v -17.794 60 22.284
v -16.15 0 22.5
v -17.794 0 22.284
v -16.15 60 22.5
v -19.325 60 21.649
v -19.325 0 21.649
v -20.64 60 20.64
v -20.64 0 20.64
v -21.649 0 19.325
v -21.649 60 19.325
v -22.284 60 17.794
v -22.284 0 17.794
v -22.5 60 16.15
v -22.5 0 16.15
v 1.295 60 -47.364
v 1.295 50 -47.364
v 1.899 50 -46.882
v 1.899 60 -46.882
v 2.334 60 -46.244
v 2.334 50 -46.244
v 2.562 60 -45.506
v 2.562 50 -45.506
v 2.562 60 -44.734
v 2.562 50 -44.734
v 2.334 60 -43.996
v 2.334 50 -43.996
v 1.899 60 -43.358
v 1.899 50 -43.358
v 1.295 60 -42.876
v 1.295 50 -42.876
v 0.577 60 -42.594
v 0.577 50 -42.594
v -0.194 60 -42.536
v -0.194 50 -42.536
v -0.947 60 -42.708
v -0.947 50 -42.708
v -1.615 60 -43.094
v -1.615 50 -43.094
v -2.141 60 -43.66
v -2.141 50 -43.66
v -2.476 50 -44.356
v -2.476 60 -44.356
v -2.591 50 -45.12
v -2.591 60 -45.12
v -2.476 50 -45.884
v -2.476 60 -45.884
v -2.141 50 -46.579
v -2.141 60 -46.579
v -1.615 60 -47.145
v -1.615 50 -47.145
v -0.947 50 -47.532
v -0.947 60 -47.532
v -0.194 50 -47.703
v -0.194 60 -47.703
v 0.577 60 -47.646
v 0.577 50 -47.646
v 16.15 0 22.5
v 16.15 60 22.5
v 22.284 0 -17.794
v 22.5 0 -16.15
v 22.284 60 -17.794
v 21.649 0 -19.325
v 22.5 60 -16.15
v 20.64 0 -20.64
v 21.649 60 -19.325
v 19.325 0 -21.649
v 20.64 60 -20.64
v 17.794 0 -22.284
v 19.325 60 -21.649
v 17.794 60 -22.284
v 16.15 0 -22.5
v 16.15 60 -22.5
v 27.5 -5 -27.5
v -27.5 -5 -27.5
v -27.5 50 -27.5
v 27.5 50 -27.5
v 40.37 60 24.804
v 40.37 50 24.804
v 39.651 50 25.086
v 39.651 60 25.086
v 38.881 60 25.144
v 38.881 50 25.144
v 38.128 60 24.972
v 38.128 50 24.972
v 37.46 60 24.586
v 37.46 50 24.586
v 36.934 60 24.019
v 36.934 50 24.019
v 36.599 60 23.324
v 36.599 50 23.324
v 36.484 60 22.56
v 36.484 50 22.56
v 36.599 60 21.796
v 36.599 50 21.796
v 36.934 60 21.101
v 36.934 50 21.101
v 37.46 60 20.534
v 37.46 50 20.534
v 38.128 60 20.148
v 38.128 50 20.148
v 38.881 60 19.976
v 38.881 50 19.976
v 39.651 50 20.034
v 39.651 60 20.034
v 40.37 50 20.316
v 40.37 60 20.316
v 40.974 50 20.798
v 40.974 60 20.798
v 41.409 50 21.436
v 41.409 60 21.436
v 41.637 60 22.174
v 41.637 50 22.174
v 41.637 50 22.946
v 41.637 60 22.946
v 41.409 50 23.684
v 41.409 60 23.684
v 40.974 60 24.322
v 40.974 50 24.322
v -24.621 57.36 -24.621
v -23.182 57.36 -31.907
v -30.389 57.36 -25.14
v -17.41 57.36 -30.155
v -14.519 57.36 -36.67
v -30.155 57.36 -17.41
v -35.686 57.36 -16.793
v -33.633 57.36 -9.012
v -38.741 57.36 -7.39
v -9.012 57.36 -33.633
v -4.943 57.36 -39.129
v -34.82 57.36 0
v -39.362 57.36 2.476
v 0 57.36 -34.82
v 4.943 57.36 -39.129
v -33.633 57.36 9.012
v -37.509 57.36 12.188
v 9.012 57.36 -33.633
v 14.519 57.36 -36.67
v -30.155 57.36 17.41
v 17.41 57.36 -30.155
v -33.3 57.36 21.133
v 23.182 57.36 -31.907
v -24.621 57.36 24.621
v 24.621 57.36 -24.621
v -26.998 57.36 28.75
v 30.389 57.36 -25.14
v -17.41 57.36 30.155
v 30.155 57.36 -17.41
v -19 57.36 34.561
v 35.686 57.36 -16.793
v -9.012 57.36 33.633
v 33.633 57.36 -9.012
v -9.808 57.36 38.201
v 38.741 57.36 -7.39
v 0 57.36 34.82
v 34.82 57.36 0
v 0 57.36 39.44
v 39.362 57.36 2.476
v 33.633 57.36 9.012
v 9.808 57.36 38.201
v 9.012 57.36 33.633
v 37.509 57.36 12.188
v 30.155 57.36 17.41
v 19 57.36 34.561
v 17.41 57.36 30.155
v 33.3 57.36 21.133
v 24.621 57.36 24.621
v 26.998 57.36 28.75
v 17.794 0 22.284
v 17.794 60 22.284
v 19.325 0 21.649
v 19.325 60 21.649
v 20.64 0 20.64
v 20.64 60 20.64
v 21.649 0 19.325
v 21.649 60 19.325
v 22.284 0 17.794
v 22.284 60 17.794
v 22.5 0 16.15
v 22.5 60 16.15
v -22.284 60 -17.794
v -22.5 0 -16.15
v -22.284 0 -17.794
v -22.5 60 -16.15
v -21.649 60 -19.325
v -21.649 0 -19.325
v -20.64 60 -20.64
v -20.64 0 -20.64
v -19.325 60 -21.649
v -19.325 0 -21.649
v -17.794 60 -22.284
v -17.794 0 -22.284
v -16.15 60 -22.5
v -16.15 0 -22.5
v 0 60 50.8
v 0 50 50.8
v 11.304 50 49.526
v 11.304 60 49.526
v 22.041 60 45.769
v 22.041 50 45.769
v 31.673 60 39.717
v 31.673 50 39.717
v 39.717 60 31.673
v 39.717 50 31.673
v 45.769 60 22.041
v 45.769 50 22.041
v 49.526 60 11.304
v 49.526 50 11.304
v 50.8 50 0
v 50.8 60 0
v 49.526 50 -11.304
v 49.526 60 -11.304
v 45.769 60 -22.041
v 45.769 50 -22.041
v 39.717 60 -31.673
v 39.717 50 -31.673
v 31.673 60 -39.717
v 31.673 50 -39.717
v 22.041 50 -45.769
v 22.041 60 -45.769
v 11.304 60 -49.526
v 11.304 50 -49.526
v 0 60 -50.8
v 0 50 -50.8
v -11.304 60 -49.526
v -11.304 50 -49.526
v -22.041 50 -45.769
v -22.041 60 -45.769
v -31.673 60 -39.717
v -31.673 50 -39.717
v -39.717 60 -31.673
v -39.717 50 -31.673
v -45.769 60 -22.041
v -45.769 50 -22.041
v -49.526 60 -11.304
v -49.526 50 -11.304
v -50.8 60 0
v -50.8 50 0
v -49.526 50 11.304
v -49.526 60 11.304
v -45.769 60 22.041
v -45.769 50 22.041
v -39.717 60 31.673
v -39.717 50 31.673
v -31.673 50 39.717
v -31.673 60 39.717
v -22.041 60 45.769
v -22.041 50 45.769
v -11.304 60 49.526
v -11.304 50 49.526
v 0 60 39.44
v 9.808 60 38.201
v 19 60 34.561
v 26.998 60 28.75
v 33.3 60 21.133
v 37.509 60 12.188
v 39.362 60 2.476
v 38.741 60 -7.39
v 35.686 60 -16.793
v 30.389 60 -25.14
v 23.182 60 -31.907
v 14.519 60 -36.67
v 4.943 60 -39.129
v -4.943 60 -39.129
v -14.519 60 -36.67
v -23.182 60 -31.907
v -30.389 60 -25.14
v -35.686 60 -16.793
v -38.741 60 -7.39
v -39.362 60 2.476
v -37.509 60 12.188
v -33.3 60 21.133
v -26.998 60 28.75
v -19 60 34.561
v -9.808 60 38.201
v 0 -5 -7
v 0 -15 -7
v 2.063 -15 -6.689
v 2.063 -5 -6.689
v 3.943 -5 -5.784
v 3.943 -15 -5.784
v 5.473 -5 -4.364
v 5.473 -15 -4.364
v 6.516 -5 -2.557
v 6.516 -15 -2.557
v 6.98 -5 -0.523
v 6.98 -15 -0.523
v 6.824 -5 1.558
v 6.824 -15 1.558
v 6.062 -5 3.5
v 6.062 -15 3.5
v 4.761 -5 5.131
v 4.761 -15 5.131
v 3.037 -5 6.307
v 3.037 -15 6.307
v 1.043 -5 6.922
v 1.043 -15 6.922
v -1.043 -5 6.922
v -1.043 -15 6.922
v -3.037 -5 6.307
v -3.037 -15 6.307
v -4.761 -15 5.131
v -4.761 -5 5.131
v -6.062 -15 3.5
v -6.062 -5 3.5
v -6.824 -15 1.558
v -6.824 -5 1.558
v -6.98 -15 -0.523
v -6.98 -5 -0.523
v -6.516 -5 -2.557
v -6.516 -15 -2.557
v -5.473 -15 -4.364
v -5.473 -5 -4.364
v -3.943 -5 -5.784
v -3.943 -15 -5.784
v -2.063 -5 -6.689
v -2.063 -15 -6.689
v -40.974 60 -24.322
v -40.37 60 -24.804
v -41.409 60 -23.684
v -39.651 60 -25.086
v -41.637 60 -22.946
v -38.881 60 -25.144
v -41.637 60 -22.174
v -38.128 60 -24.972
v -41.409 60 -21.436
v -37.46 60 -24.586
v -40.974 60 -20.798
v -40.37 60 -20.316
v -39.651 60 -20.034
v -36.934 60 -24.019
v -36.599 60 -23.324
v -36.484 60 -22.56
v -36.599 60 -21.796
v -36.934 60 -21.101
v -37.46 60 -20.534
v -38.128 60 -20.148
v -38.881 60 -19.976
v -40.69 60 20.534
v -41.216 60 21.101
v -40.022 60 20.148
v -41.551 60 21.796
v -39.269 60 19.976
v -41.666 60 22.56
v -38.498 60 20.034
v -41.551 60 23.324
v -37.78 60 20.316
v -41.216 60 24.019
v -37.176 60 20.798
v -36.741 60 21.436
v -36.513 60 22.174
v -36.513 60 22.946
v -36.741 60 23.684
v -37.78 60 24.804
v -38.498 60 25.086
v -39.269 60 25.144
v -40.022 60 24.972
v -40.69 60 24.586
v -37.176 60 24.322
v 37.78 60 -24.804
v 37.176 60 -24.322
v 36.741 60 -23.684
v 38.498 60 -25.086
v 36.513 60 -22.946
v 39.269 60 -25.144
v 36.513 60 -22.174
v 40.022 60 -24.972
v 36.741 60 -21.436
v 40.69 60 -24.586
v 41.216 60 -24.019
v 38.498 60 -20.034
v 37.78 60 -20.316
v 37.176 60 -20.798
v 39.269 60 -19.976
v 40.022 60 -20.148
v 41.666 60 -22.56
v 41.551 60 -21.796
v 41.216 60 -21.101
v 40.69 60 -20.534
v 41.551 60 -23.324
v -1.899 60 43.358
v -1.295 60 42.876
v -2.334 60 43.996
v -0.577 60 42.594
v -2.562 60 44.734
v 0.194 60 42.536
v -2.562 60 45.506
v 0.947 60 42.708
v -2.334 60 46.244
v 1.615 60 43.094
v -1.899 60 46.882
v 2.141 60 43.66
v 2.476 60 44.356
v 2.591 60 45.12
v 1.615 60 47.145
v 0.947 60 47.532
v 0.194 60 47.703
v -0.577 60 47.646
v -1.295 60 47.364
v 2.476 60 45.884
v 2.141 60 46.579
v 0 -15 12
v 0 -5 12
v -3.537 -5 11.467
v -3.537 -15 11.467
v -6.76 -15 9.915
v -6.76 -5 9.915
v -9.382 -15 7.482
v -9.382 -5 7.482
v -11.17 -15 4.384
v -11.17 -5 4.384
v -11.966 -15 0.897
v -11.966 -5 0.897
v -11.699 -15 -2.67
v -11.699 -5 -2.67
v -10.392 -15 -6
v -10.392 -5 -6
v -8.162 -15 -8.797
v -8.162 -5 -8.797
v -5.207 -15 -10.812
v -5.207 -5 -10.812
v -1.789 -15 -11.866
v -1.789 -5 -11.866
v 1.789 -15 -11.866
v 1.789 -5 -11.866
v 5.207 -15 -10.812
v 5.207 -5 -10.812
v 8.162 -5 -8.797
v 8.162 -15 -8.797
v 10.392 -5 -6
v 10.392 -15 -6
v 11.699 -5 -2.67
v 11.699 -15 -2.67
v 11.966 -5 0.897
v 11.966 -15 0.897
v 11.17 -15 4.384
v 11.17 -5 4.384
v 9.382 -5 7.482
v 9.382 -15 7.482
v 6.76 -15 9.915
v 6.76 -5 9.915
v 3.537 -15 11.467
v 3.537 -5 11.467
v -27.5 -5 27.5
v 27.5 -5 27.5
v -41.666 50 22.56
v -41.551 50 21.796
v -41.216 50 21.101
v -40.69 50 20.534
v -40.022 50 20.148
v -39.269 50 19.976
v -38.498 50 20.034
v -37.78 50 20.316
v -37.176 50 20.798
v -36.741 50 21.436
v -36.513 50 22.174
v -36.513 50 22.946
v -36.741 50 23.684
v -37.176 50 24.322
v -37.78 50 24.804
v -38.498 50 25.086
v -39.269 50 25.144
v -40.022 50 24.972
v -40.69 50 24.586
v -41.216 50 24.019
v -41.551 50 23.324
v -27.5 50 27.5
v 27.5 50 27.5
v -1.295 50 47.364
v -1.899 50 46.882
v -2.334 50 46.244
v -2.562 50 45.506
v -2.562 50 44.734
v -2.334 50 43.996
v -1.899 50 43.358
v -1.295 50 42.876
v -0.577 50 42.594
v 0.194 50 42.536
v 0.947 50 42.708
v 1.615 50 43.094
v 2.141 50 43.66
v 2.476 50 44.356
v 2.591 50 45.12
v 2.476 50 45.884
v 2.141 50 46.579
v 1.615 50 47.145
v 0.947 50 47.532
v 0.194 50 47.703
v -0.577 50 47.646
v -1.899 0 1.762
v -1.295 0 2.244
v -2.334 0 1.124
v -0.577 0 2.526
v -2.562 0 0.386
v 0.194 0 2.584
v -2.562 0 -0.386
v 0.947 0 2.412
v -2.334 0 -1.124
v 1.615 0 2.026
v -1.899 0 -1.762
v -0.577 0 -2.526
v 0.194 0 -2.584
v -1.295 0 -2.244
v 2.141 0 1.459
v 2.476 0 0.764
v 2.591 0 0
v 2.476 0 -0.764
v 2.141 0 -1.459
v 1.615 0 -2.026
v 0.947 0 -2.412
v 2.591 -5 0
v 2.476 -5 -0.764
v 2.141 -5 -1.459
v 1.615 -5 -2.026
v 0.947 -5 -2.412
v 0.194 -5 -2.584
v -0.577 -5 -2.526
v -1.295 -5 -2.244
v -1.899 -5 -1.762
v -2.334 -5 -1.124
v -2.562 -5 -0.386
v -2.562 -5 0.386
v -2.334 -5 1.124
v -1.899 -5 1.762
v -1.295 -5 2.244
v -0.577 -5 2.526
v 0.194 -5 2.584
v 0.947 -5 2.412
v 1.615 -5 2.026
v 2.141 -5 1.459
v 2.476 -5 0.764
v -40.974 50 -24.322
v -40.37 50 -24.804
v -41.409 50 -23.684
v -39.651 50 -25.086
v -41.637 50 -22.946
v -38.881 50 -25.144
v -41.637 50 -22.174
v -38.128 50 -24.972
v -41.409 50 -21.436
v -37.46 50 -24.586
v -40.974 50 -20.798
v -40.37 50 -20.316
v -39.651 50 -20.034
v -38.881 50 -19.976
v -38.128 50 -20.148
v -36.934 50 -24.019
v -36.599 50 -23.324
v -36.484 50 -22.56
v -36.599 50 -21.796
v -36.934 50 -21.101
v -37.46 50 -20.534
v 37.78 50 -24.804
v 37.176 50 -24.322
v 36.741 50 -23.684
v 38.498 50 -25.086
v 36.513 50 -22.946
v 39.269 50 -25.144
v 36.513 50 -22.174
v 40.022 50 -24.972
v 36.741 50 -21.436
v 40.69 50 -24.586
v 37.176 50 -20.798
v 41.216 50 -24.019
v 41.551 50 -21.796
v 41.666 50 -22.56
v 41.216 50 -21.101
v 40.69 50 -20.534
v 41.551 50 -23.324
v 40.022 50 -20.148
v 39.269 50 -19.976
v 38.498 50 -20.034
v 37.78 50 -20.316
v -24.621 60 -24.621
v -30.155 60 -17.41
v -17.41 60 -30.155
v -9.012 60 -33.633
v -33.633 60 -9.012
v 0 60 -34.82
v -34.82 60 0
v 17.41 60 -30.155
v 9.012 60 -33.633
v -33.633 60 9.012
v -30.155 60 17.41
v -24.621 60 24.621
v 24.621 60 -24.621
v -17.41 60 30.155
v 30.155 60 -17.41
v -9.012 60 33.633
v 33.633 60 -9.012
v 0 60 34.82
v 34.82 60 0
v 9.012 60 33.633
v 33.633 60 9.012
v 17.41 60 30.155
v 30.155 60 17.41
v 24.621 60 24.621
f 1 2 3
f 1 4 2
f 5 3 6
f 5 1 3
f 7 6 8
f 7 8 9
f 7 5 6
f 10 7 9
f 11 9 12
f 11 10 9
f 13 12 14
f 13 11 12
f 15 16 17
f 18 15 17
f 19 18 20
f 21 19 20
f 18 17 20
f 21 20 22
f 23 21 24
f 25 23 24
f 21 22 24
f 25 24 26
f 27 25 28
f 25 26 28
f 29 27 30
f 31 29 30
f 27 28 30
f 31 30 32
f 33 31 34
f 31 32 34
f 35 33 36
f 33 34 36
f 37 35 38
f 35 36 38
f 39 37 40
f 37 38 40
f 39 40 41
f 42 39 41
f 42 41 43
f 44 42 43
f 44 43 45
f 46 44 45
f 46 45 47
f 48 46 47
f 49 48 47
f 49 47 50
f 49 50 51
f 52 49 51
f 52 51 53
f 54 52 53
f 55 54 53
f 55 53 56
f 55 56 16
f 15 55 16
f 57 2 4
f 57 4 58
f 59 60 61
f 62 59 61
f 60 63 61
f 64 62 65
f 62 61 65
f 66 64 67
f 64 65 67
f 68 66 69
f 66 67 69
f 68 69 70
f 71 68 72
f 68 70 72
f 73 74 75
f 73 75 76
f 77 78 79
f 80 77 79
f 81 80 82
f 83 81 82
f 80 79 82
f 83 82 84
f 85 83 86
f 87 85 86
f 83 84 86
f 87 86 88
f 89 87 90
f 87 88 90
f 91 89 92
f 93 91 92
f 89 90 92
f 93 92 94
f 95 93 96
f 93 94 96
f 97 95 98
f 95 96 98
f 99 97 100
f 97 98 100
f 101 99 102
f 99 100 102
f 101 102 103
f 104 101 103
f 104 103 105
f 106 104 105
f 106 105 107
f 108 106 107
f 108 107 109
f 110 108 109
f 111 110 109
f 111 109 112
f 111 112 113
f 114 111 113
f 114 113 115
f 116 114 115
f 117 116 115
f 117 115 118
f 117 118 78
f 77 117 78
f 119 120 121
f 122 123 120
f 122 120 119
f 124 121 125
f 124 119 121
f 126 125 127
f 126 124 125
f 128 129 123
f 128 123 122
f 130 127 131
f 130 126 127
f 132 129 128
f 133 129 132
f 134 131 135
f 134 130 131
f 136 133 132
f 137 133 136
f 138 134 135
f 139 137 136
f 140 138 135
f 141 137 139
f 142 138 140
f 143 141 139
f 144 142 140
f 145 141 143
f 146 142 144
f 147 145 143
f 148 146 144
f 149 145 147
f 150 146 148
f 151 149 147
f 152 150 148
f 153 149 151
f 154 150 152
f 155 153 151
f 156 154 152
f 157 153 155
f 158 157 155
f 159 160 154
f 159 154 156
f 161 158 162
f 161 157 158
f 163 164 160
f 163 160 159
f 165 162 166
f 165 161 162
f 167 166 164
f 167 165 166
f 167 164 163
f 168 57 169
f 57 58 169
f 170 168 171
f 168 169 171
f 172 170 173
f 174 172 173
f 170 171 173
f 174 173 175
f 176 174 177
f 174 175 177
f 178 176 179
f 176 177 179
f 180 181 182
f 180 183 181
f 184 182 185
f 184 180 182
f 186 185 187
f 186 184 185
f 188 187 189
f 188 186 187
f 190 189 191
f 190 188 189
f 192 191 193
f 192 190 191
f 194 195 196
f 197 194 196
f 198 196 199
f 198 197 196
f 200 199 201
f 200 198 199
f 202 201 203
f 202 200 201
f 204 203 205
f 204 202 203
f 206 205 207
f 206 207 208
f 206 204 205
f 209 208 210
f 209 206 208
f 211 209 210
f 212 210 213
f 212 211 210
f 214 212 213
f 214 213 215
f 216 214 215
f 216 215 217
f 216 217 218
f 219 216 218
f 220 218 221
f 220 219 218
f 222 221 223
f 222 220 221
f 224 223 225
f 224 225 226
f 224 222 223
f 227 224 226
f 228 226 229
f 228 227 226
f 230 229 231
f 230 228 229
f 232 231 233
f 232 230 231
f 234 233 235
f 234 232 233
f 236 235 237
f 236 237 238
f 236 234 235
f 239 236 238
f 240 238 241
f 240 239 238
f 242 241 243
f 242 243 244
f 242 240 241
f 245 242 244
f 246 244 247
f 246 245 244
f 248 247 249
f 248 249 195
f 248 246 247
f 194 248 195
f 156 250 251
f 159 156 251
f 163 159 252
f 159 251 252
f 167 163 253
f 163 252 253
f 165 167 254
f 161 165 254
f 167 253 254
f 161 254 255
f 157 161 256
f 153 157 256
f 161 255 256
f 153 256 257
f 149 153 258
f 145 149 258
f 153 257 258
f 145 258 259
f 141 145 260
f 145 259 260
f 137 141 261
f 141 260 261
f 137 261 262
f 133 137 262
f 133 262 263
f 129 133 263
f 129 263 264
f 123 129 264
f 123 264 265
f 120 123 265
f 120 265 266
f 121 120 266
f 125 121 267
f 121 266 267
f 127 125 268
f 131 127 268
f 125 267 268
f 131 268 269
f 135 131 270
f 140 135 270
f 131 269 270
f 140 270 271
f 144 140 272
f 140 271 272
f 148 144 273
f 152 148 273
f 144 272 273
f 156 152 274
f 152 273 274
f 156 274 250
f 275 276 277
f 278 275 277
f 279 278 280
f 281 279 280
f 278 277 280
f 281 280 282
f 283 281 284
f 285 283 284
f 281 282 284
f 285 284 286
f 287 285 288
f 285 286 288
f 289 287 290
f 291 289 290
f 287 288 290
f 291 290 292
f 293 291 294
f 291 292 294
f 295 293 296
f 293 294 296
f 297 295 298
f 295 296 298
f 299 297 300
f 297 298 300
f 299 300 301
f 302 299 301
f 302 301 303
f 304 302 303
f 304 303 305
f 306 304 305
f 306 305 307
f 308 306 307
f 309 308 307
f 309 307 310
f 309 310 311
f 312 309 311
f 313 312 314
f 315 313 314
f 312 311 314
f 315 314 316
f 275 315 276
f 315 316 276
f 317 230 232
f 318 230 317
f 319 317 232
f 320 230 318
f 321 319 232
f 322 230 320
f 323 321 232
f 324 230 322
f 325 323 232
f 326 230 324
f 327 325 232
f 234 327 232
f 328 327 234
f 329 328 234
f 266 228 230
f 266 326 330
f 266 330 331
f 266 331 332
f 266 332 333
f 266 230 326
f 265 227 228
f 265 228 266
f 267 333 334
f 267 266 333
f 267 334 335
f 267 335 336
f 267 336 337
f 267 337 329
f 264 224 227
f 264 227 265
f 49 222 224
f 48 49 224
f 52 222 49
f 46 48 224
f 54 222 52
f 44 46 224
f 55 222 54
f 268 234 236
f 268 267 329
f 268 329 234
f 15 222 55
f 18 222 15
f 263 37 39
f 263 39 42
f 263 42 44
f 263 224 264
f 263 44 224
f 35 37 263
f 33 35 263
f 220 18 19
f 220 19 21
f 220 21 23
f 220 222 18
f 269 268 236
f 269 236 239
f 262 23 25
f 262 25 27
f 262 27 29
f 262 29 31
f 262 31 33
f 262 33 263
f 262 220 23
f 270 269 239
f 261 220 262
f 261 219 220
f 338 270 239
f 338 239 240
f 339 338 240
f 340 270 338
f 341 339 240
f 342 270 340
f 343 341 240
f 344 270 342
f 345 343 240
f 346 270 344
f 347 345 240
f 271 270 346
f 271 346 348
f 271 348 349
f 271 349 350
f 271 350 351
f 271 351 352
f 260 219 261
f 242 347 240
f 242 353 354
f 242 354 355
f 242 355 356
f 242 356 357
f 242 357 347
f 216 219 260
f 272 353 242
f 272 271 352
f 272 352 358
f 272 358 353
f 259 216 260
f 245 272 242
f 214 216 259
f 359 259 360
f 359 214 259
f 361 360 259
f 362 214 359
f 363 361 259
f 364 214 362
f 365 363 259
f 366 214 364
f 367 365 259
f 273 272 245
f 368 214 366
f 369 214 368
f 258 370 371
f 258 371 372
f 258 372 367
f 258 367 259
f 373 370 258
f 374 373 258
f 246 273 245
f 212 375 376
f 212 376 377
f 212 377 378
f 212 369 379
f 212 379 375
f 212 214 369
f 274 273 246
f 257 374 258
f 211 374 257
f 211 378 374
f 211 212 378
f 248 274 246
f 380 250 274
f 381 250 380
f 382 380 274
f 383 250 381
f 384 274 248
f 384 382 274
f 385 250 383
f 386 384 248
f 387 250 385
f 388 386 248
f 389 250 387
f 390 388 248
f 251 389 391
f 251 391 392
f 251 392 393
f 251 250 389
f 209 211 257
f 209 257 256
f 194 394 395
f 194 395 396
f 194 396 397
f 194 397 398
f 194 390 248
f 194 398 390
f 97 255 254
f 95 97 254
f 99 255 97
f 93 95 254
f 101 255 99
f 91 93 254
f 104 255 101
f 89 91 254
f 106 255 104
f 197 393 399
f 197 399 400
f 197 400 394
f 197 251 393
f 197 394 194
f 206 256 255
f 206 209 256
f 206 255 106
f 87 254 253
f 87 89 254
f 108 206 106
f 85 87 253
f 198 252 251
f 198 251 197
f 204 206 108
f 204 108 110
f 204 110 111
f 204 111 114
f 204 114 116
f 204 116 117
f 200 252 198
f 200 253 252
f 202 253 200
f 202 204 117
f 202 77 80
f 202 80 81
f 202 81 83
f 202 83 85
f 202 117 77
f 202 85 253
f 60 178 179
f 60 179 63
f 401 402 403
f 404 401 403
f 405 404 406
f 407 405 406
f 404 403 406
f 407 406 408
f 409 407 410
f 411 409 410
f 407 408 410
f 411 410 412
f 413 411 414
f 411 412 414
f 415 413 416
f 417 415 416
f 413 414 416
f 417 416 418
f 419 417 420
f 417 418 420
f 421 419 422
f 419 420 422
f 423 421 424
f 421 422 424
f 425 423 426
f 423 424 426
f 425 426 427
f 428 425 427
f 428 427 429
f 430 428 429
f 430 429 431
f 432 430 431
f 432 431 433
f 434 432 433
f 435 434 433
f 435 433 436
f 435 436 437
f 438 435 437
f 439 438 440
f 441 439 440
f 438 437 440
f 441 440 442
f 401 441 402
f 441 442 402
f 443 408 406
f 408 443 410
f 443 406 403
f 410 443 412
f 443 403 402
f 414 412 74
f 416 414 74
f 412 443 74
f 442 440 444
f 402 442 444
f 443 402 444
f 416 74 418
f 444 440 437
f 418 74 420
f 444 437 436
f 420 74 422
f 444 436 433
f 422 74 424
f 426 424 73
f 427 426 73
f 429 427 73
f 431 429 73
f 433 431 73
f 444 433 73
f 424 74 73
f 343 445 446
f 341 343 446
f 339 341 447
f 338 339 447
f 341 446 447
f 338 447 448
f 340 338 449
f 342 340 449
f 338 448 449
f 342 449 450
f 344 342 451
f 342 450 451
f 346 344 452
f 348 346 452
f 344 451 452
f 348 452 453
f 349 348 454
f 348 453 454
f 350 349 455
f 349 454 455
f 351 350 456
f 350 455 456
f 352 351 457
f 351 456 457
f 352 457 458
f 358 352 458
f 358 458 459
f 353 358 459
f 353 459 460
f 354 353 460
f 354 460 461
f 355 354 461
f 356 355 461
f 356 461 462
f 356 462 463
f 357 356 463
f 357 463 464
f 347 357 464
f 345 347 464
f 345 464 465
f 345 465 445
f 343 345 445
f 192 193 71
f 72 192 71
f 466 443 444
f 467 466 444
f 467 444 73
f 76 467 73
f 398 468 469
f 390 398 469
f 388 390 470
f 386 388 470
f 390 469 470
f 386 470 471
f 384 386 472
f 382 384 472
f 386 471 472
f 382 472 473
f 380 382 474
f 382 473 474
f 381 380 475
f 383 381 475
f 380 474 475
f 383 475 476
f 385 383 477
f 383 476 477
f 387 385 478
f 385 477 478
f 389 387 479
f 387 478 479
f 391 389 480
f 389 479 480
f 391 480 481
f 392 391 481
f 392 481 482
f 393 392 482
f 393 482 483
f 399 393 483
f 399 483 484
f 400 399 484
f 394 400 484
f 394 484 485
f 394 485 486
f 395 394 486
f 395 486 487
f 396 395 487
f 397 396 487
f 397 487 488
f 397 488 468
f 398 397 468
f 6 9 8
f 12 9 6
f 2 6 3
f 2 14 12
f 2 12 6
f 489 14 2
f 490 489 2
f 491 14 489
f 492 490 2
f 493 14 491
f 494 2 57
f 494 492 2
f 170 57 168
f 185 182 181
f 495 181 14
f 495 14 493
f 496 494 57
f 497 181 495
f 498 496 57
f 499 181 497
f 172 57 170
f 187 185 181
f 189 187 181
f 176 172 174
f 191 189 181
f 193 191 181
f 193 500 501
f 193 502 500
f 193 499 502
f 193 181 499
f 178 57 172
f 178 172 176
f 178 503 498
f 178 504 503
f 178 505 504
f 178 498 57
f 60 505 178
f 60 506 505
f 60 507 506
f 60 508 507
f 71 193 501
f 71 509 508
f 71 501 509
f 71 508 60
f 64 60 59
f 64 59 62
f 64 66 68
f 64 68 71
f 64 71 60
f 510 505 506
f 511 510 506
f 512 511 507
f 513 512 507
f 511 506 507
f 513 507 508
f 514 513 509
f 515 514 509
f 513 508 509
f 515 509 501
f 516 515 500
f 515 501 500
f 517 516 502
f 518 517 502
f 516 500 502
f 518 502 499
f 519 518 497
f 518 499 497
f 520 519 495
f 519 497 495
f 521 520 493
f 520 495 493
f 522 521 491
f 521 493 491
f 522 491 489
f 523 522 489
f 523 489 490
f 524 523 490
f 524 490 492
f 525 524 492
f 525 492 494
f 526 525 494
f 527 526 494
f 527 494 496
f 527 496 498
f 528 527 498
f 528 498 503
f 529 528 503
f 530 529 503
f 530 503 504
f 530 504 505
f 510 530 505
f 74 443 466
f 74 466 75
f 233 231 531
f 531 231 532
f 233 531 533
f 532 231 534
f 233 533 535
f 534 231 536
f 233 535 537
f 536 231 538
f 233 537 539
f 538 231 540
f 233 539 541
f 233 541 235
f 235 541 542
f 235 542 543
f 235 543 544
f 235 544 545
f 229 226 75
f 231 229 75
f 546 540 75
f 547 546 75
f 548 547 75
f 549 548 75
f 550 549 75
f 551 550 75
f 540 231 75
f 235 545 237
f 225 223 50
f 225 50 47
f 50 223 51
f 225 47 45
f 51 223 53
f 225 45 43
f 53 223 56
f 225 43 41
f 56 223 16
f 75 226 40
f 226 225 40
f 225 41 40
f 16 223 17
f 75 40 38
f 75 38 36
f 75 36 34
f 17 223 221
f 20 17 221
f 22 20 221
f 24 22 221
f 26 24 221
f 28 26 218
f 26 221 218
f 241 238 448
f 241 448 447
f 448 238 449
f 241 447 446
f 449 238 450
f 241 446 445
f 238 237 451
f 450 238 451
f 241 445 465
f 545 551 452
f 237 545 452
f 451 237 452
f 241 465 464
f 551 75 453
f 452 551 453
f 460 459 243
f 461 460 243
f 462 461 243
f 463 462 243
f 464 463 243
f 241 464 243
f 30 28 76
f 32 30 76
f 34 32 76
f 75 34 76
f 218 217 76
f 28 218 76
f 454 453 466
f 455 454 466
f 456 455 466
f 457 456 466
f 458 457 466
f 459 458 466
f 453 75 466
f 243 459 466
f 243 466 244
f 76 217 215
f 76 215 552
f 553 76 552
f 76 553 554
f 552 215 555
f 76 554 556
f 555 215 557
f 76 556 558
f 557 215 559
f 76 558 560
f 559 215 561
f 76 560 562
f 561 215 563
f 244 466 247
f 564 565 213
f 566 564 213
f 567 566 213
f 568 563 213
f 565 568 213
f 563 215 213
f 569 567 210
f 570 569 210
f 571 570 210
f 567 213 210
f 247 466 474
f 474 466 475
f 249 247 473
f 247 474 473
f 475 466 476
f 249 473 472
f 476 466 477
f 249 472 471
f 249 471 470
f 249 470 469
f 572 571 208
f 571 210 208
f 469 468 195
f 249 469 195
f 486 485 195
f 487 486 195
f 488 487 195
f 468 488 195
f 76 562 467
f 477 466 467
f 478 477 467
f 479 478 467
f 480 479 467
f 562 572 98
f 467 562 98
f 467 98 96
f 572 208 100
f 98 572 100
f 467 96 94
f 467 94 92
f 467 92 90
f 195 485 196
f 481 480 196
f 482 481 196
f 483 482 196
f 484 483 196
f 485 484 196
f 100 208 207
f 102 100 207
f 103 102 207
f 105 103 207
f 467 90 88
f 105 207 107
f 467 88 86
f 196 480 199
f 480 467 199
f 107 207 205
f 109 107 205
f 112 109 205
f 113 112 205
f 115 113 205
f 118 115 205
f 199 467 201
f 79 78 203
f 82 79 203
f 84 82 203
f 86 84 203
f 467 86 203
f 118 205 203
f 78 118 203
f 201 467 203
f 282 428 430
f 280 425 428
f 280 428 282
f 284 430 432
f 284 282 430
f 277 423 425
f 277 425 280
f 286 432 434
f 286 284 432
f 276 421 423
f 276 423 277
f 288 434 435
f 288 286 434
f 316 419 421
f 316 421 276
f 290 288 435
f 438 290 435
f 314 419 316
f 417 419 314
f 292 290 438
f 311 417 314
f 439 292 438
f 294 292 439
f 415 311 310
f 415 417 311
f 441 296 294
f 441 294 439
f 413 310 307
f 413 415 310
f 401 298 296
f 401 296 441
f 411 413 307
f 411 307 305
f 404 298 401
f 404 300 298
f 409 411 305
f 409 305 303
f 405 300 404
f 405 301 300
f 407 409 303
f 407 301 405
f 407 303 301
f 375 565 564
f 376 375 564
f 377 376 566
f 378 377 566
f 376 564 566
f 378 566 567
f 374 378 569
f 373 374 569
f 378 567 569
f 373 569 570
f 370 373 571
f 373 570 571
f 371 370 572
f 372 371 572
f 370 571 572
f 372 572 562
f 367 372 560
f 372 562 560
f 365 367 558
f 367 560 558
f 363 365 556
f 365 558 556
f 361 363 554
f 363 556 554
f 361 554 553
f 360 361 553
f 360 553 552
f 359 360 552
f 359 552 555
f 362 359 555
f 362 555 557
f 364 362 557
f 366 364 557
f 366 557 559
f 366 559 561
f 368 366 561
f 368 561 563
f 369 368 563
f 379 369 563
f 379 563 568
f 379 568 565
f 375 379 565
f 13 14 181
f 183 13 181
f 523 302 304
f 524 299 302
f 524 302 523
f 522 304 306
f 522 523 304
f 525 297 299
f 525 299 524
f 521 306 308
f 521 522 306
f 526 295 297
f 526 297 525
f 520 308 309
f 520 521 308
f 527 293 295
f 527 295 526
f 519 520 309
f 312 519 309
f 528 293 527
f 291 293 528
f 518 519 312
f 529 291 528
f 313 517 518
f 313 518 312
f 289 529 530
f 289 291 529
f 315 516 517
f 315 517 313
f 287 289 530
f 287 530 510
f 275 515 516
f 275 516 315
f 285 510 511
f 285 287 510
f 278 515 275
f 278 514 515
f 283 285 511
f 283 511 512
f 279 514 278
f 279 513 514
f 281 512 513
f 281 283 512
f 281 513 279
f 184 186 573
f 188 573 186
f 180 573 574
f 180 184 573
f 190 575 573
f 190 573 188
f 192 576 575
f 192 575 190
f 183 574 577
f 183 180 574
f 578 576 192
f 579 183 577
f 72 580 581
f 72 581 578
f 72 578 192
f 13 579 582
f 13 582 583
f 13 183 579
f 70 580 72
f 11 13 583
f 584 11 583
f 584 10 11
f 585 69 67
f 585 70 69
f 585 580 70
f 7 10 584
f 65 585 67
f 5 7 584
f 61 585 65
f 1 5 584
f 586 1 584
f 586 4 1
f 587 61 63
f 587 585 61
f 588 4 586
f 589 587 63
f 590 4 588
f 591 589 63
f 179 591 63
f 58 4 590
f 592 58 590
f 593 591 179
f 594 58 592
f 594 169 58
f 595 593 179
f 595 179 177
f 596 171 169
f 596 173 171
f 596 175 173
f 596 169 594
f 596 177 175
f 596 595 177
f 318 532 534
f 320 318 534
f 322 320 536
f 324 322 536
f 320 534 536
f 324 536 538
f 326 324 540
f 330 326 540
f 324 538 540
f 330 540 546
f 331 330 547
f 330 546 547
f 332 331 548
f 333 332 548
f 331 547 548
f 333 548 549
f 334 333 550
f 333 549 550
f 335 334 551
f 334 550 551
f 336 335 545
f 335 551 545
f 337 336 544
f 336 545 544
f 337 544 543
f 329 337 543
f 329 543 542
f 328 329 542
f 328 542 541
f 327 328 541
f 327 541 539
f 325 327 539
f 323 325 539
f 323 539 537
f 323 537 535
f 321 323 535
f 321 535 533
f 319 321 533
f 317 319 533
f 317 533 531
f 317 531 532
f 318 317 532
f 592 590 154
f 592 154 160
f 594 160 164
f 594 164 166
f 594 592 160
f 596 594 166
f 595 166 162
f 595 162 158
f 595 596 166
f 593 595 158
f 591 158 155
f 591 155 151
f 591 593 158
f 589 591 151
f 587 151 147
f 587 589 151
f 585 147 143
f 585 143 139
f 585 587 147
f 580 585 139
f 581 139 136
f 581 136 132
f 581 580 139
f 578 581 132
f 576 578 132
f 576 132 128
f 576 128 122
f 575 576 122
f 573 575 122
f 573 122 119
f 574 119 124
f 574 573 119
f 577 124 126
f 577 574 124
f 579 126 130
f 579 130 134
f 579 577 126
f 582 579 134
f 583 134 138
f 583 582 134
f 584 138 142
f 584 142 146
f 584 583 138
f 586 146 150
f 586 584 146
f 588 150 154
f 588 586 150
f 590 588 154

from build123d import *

# Parameters (mm, degrees)
SKETCH1_W                  = 55
SKETCH1_H                  = 55
SKETCH1_W_2                = 45
SKETCH1_H_2                = 45
BOSS_EXTRUDE1_DEPTH        = 5
SKETCH1_3_W                = 55
SKETCH1_3_H                = 55
SKETCH1_3_W_2              = 45
SKETCH1_3_H_2              = 45
BOSS_EXTRUDE2_DEPTH        = 60
SKETCH6_R                  = 50.8
SKETCH6_W                  = 55
SKETCH6_H                  = 55
BOSS_EXTRUDE4_DEPTH        = 10
SKETCH7_R                  = 12
BOSS_EXTRUDE5_DEPTH        = 10
F_6_0_204_DIAMETER_HOLE2_D = 5.1816
SKETCH11_R                 = 7
CUT_EXTRUDE1_DEPTH         = 10
SKETCH13_R                 = 39.439805153
SKETCH13_R_2               = 34.819805153
CUT_EXTRUDE3_DEPTH         = 2.64
FILLET2_R                  = 6.35
F_6_0_204_DIAMETER_HOLE1_D = 5.1816
CIRPATTERN2_COUNT          = 6


with BuildPart() as part:
    # Sketch1 → Boss-Extrude1 (new body)
    with BuildSketch(Plane(origin=(0, 0, 0), x_dir=(1, 0, 0), z_dir=(0, 1, 0))):
        Rectangle(SKETCH1_W, SKETCH1_H)
        Rectangle(SKETCH1_W_2, SKETCH1_H_2, mode=Mode.SUBTRACT)
        Rectangle(SKETCH1_W_2, SKETCH1_H_2)
    extrude(amount=-BOSS_EXTRUDE1_DEPTH)

    # Sketch1<3> → Boss-Extrude2 (add)
    with BuildSketch(Plane(origin=(0, 0, 0), x_dir=(1, 0, 0), z_dir=(0, 1, 0))):
        Rectangle(SKETCH1_3_W, SKETCH1_3_H)
        Rectangle(SKETCH1_3_W_2, SKETCH1_3_H_2, mode=Mode.SUBTRACT)
    extrude(amount=BOSS_EXTRUDE2_DEPTH)

    # Sketch6 → Boss-Extrude4 (add)
    with BuildSketch(Plane(origin=(0, 60, 0), x_dir=(1, 0, 0), z_dir=(0, 1, 0))):
        with Locations(Location((0, 0, 0), (0, 0, 270))):
            Circle(SKETCH6_R)
        Rectangle(SKETCH6_W, SKETCH6_H, mode=Mode.SUBTRACT)
    extrude(amount=-BOSS_EXTRUDE4_DEPTH)

    # Sketch7 → Boss-Extrude5 (add)
    with BuildSketch(Plane.XZ.offset(5)):
        with Locations(Location((0, 0, 0), (0, 0, 90))):
            Circle(SKETCH7_R)
    extrude(amount=BOSS_EXTRUDE5_DEPTH)

    # #6 (0.204) Diameter Hole2 (through all)
    with Locations(Plane(origin=(0, -15, 0), x_dir=(-1, 0, 0), z_dir=(0, -1, 0))):
        with Locations((0, 0)):
            Hole(F_6_0_204_DIAMETER_HOLE2_D / 2)

    # Sketch11 → Cut-Extrude1 (cut)
    with BuildSketch(Plane.XZ.offset(15)):
        with Locations(Location((0, 0, 0), (0, 0, 270))):
            Circle(SKETCH11_R)
    extrude(amount=-CUT_EXTRUDE1_DEPTH, mode=Mode.SUBTRACT)

    # Sketch13 → Cut-Extrude3 (cut)
    with BuildSketch(Plane(origin=(0, 60, 0), x_dir=(1, 0, 0), z_dir=(0, 1, 0))):
        with Locations(Location((0, 0, 0), (0, 0, 270))):
            Circle(SKETCH13_R)
        with Locations(Location((0, 0, 0), (0, 0, 270))):
            Circle(SKETCH13_R_2, mode=Mode.SUBTRACT)
    extrude(amount=-CUT_EXTRUDE3_DEPTH, mode=Mode.SUBTRACT)

    # Fillet2
    fillet2_edges = [part.edges().sort_by_distance(p)[0] for p in [
        (22.5, 30, 22.5),
        (-22.5, 30, 22.5),
        (-22.5, 30, -22.5),
        (22.5, 30, -22.5),
    ]]
    fillet(fillet2_edges, radius=FILLET2_R)

    # #6 (0.204) Diameter Hole1 (through all)
    with Locations(Plane(origin=(0, 60, 0), x_dir=(1, 0, 0), z_dir=(0, 1, 0))):
        with Locations((-39.074981848, -22.559951288)):
            f_6_0_204_diameter_hole1 = Hole(F_6_0_204_DIAMETER_HOLE1_D / 2)

    # CirPattern2: #6 (0.204) Diameter Hole1 ×6 about axis
    cirpattern2_axis = Axis((0, 0, 0), (0, 1, 0))
    for i in range(1, CIRPATTERN2_COUNT):
        add(f_6_0_204_diameter_hole1.rotate(cirpattern2_axis, i * 360 / CIRPATTERN2_COUNT), mode=Mode.SUBTRACT)


solid = part.part
